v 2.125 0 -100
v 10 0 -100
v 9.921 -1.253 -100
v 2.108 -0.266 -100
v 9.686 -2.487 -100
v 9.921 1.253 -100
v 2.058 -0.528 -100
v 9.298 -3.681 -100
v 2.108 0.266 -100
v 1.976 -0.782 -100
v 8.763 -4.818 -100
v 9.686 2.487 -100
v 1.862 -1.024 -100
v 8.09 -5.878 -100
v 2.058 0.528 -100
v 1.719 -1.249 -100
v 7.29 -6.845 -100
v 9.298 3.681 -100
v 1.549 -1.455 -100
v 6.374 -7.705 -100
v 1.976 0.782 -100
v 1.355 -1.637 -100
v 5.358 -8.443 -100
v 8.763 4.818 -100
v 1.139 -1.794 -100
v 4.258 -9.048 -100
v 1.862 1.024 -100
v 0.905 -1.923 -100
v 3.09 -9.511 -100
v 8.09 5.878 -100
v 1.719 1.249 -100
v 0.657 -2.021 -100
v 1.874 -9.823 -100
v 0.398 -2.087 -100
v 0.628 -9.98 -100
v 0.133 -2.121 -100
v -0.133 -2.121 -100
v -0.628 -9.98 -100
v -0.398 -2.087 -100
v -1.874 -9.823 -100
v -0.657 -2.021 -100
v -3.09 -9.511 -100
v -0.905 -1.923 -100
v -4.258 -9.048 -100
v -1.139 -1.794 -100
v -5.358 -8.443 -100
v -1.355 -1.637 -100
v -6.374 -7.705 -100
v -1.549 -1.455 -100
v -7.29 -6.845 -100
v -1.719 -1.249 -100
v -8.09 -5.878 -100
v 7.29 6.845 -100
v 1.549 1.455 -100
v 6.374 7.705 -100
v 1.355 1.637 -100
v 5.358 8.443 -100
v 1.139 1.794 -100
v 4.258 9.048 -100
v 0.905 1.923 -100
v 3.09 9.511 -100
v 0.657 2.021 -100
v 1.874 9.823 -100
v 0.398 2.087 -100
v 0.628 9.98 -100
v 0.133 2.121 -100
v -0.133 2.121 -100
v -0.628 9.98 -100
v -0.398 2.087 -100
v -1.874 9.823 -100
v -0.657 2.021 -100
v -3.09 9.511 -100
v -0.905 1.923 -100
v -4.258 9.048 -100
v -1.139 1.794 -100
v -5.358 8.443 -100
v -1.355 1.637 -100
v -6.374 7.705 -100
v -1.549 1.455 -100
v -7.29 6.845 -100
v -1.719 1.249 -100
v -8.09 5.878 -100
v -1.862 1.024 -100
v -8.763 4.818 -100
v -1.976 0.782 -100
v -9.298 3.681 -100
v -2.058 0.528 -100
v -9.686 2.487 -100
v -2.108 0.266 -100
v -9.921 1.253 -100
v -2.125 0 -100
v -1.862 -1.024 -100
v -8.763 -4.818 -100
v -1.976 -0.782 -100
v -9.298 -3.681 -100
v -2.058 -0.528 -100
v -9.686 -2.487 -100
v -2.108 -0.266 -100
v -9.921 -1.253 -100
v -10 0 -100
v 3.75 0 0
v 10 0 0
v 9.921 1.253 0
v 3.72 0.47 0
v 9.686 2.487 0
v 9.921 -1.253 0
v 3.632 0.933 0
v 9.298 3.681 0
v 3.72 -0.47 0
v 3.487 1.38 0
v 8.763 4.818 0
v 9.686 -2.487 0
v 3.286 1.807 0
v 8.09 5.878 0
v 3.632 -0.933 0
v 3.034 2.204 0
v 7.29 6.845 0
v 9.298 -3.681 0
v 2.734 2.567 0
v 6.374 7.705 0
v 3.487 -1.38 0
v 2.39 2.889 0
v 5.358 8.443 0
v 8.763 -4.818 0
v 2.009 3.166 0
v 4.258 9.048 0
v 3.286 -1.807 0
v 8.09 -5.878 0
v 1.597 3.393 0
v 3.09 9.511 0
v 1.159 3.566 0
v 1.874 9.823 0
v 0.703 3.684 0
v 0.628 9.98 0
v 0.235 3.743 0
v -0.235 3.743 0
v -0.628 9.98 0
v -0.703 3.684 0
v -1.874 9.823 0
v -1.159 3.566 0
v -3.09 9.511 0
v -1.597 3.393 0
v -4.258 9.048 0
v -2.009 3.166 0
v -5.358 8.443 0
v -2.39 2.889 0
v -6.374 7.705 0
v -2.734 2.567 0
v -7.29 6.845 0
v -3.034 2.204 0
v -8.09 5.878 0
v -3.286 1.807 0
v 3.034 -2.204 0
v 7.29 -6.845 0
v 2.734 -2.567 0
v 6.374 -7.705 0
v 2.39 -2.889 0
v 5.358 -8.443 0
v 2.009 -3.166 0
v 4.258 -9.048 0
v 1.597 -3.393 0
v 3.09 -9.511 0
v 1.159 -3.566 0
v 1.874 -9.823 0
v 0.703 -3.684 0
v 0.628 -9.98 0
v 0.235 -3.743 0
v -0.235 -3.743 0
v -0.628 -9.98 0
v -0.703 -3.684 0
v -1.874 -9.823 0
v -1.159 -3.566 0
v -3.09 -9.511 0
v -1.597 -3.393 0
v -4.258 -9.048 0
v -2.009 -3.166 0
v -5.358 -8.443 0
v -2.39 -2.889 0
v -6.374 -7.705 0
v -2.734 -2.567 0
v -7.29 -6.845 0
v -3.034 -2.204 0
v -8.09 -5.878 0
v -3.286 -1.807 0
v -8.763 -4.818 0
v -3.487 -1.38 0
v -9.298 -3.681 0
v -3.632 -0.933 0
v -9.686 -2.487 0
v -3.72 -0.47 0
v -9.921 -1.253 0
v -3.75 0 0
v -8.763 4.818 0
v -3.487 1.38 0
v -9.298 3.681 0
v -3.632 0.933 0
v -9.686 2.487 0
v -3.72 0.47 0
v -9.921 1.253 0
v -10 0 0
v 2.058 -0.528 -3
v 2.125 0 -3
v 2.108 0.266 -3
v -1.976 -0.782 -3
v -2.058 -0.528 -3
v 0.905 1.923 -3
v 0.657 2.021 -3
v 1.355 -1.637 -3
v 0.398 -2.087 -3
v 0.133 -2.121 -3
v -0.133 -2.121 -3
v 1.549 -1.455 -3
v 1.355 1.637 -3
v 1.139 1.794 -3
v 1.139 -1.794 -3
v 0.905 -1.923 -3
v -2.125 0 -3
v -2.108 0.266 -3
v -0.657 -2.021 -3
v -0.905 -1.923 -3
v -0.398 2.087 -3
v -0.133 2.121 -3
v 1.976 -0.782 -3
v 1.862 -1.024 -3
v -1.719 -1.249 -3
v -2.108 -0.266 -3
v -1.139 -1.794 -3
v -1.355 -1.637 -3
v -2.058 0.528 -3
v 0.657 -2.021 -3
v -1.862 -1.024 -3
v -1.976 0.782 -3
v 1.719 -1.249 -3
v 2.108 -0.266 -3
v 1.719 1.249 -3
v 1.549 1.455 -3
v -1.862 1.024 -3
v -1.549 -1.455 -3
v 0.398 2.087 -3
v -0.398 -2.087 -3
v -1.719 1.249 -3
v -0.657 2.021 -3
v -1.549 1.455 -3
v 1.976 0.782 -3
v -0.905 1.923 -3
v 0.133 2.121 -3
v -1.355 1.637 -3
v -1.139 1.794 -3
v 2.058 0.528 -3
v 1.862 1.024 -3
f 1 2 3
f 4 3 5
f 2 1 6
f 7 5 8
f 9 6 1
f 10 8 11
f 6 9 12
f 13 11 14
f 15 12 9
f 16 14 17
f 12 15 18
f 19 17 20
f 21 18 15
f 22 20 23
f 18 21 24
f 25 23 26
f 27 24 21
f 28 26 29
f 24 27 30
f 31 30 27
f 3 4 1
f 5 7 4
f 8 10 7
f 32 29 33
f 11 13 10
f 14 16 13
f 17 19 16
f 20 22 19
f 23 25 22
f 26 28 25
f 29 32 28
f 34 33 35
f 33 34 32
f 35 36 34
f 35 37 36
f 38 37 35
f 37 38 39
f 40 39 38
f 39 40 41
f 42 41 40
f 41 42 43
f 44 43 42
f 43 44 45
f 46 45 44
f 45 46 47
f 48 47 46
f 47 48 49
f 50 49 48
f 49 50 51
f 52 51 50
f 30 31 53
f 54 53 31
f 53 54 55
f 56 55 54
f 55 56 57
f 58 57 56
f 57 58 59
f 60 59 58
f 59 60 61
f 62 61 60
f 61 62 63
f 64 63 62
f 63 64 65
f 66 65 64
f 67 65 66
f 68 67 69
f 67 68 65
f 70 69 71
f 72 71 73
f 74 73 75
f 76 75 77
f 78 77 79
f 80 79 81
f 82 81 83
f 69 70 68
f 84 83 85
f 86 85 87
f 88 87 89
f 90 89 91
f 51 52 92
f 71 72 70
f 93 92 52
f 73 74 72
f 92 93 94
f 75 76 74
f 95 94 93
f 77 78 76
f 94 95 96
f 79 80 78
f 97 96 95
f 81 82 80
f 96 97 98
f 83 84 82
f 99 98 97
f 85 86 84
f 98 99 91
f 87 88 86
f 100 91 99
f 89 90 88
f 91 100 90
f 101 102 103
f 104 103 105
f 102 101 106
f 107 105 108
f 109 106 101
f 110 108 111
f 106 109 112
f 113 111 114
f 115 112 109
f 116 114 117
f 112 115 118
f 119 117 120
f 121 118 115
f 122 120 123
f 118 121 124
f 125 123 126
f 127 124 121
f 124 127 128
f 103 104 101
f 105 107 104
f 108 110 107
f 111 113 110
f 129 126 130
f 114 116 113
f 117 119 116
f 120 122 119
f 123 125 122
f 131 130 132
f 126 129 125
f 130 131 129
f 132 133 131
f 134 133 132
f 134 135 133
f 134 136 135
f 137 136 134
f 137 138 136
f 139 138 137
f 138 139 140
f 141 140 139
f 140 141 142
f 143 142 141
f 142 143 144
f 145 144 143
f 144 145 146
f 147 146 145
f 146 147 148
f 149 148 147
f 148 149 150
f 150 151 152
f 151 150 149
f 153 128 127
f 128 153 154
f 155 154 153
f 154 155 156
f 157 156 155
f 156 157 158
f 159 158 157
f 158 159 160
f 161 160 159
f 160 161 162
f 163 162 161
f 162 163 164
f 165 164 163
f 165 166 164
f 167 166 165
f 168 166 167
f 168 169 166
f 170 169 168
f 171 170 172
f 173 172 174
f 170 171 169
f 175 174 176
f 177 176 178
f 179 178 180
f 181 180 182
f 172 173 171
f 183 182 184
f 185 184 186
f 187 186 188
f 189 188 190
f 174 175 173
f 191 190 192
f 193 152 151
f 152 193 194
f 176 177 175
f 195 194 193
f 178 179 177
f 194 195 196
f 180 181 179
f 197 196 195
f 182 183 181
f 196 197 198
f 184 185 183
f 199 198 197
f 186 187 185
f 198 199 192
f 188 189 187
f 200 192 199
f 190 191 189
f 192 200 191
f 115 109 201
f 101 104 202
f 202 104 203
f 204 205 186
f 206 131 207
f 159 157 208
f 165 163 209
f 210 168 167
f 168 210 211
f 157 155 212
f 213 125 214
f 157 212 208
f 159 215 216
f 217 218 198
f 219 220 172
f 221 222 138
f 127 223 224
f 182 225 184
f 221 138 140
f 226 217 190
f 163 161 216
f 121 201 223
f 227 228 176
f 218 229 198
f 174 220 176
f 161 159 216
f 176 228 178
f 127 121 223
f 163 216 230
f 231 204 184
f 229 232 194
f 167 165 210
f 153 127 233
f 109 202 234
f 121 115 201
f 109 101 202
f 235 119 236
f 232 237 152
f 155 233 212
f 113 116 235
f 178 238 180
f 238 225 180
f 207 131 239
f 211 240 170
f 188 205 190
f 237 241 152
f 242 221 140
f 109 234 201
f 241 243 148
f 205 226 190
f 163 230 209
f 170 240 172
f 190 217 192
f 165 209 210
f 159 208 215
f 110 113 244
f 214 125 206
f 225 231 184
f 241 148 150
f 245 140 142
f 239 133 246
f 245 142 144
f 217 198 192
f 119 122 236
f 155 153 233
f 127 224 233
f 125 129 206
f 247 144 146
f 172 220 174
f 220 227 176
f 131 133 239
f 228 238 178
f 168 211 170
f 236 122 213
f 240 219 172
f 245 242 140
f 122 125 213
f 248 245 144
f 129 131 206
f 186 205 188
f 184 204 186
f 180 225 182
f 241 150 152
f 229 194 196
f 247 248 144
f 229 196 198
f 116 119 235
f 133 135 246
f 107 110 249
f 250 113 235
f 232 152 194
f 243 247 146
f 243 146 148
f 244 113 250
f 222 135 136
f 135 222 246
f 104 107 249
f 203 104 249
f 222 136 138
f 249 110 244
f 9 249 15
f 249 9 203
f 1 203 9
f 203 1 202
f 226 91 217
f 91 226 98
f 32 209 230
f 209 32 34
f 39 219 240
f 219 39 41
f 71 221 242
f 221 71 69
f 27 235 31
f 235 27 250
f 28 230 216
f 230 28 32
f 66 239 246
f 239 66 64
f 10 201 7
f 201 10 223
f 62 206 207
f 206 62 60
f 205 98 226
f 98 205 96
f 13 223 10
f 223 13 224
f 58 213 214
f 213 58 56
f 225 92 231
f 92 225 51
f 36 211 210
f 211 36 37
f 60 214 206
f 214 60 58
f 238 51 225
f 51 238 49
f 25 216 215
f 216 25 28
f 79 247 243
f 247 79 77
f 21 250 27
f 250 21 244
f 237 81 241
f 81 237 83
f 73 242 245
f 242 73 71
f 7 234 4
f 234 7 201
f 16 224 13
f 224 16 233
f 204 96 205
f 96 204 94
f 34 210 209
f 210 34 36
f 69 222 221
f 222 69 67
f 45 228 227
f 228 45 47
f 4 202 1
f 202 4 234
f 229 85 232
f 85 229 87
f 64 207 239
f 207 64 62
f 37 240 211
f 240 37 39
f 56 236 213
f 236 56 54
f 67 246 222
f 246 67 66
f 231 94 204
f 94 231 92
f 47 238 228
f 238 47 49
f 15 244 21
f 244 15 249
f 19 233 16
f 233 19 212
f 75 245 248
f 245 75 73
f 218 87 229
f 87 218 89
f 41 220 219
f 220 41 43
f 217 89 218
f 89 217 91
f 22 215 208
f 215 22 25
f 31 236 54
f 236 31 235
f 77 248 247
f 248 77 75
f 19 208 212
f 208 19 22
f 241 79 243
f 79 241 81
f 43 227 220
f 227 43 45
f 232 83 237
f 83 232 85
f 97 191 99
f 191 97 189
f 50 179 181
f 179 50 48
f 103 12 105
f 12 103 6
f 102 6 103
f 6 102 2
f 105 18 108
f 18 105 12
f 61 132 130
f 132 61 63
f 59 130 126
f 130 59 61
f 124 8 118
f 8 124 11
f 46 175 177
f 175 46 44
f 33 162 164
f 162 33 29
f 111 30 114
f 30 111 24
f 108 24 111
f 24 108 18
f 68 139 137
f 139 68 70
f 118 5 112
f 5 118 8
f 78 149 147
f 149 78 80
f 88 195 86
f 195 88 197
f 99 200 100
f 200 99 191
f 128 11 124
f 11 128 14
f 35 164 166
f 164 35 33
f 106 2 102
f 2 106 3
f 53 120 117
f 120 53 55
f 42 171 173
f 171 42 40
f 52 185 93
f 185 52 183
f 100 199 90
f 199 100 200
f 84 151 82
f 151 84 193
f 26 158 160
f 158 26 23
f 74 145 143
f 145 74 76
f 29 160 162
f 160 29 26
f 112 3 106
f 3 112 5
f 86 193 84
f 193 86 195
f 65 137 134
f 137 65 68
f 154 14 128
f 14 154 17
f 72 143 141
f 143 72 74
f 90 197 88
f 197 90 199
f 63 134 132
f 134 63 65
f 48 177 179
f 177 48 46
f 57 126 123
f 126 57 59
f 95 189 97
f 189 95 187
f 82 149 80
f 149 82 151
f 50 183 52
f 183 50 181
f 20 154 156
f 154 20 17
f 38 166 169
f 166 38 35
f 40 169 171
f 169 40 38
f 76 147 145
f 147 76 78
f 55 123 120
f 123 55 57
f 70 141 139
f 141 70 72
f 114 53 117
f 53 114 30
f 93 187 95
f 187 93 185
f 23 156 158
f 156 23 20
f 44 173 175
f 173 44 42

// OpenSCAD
$fn = 50;


difference() {
	union() {
		translate(v = [0, 0, -100.0000000000]) {
			cylinder(h = 100, r = 10.0000000000);
		}
		cylinder(h = 0, r = 19.0000000000);
	}
	union() {
		translate(v = [0, 0, 0]) {
			rotate(a = [0, 0, 0]) {
				difference() {
					union() {
						#translate(v = [0, 0, -100.0000000000]) {
							cylinder(h = 100, r = 2.0000000000);
						}
						#translate(v = [0, 0, -3]) {
							cylinder(h = 3, r = 10.0000000000, r1 = 2.1250000000, r2 = 3.7500000000);
						}
						#translate(v = [0, 0, -100.0000000000]) {
							cylinder(h = 100, r = 2.1250000000);
						}
						#translate(v = [0, 0, -100.0000000000]) {
							cylinder(h = 100, r = 2.0000000000);
						}
					}
					union();
				}
			}
		}
	}
}
